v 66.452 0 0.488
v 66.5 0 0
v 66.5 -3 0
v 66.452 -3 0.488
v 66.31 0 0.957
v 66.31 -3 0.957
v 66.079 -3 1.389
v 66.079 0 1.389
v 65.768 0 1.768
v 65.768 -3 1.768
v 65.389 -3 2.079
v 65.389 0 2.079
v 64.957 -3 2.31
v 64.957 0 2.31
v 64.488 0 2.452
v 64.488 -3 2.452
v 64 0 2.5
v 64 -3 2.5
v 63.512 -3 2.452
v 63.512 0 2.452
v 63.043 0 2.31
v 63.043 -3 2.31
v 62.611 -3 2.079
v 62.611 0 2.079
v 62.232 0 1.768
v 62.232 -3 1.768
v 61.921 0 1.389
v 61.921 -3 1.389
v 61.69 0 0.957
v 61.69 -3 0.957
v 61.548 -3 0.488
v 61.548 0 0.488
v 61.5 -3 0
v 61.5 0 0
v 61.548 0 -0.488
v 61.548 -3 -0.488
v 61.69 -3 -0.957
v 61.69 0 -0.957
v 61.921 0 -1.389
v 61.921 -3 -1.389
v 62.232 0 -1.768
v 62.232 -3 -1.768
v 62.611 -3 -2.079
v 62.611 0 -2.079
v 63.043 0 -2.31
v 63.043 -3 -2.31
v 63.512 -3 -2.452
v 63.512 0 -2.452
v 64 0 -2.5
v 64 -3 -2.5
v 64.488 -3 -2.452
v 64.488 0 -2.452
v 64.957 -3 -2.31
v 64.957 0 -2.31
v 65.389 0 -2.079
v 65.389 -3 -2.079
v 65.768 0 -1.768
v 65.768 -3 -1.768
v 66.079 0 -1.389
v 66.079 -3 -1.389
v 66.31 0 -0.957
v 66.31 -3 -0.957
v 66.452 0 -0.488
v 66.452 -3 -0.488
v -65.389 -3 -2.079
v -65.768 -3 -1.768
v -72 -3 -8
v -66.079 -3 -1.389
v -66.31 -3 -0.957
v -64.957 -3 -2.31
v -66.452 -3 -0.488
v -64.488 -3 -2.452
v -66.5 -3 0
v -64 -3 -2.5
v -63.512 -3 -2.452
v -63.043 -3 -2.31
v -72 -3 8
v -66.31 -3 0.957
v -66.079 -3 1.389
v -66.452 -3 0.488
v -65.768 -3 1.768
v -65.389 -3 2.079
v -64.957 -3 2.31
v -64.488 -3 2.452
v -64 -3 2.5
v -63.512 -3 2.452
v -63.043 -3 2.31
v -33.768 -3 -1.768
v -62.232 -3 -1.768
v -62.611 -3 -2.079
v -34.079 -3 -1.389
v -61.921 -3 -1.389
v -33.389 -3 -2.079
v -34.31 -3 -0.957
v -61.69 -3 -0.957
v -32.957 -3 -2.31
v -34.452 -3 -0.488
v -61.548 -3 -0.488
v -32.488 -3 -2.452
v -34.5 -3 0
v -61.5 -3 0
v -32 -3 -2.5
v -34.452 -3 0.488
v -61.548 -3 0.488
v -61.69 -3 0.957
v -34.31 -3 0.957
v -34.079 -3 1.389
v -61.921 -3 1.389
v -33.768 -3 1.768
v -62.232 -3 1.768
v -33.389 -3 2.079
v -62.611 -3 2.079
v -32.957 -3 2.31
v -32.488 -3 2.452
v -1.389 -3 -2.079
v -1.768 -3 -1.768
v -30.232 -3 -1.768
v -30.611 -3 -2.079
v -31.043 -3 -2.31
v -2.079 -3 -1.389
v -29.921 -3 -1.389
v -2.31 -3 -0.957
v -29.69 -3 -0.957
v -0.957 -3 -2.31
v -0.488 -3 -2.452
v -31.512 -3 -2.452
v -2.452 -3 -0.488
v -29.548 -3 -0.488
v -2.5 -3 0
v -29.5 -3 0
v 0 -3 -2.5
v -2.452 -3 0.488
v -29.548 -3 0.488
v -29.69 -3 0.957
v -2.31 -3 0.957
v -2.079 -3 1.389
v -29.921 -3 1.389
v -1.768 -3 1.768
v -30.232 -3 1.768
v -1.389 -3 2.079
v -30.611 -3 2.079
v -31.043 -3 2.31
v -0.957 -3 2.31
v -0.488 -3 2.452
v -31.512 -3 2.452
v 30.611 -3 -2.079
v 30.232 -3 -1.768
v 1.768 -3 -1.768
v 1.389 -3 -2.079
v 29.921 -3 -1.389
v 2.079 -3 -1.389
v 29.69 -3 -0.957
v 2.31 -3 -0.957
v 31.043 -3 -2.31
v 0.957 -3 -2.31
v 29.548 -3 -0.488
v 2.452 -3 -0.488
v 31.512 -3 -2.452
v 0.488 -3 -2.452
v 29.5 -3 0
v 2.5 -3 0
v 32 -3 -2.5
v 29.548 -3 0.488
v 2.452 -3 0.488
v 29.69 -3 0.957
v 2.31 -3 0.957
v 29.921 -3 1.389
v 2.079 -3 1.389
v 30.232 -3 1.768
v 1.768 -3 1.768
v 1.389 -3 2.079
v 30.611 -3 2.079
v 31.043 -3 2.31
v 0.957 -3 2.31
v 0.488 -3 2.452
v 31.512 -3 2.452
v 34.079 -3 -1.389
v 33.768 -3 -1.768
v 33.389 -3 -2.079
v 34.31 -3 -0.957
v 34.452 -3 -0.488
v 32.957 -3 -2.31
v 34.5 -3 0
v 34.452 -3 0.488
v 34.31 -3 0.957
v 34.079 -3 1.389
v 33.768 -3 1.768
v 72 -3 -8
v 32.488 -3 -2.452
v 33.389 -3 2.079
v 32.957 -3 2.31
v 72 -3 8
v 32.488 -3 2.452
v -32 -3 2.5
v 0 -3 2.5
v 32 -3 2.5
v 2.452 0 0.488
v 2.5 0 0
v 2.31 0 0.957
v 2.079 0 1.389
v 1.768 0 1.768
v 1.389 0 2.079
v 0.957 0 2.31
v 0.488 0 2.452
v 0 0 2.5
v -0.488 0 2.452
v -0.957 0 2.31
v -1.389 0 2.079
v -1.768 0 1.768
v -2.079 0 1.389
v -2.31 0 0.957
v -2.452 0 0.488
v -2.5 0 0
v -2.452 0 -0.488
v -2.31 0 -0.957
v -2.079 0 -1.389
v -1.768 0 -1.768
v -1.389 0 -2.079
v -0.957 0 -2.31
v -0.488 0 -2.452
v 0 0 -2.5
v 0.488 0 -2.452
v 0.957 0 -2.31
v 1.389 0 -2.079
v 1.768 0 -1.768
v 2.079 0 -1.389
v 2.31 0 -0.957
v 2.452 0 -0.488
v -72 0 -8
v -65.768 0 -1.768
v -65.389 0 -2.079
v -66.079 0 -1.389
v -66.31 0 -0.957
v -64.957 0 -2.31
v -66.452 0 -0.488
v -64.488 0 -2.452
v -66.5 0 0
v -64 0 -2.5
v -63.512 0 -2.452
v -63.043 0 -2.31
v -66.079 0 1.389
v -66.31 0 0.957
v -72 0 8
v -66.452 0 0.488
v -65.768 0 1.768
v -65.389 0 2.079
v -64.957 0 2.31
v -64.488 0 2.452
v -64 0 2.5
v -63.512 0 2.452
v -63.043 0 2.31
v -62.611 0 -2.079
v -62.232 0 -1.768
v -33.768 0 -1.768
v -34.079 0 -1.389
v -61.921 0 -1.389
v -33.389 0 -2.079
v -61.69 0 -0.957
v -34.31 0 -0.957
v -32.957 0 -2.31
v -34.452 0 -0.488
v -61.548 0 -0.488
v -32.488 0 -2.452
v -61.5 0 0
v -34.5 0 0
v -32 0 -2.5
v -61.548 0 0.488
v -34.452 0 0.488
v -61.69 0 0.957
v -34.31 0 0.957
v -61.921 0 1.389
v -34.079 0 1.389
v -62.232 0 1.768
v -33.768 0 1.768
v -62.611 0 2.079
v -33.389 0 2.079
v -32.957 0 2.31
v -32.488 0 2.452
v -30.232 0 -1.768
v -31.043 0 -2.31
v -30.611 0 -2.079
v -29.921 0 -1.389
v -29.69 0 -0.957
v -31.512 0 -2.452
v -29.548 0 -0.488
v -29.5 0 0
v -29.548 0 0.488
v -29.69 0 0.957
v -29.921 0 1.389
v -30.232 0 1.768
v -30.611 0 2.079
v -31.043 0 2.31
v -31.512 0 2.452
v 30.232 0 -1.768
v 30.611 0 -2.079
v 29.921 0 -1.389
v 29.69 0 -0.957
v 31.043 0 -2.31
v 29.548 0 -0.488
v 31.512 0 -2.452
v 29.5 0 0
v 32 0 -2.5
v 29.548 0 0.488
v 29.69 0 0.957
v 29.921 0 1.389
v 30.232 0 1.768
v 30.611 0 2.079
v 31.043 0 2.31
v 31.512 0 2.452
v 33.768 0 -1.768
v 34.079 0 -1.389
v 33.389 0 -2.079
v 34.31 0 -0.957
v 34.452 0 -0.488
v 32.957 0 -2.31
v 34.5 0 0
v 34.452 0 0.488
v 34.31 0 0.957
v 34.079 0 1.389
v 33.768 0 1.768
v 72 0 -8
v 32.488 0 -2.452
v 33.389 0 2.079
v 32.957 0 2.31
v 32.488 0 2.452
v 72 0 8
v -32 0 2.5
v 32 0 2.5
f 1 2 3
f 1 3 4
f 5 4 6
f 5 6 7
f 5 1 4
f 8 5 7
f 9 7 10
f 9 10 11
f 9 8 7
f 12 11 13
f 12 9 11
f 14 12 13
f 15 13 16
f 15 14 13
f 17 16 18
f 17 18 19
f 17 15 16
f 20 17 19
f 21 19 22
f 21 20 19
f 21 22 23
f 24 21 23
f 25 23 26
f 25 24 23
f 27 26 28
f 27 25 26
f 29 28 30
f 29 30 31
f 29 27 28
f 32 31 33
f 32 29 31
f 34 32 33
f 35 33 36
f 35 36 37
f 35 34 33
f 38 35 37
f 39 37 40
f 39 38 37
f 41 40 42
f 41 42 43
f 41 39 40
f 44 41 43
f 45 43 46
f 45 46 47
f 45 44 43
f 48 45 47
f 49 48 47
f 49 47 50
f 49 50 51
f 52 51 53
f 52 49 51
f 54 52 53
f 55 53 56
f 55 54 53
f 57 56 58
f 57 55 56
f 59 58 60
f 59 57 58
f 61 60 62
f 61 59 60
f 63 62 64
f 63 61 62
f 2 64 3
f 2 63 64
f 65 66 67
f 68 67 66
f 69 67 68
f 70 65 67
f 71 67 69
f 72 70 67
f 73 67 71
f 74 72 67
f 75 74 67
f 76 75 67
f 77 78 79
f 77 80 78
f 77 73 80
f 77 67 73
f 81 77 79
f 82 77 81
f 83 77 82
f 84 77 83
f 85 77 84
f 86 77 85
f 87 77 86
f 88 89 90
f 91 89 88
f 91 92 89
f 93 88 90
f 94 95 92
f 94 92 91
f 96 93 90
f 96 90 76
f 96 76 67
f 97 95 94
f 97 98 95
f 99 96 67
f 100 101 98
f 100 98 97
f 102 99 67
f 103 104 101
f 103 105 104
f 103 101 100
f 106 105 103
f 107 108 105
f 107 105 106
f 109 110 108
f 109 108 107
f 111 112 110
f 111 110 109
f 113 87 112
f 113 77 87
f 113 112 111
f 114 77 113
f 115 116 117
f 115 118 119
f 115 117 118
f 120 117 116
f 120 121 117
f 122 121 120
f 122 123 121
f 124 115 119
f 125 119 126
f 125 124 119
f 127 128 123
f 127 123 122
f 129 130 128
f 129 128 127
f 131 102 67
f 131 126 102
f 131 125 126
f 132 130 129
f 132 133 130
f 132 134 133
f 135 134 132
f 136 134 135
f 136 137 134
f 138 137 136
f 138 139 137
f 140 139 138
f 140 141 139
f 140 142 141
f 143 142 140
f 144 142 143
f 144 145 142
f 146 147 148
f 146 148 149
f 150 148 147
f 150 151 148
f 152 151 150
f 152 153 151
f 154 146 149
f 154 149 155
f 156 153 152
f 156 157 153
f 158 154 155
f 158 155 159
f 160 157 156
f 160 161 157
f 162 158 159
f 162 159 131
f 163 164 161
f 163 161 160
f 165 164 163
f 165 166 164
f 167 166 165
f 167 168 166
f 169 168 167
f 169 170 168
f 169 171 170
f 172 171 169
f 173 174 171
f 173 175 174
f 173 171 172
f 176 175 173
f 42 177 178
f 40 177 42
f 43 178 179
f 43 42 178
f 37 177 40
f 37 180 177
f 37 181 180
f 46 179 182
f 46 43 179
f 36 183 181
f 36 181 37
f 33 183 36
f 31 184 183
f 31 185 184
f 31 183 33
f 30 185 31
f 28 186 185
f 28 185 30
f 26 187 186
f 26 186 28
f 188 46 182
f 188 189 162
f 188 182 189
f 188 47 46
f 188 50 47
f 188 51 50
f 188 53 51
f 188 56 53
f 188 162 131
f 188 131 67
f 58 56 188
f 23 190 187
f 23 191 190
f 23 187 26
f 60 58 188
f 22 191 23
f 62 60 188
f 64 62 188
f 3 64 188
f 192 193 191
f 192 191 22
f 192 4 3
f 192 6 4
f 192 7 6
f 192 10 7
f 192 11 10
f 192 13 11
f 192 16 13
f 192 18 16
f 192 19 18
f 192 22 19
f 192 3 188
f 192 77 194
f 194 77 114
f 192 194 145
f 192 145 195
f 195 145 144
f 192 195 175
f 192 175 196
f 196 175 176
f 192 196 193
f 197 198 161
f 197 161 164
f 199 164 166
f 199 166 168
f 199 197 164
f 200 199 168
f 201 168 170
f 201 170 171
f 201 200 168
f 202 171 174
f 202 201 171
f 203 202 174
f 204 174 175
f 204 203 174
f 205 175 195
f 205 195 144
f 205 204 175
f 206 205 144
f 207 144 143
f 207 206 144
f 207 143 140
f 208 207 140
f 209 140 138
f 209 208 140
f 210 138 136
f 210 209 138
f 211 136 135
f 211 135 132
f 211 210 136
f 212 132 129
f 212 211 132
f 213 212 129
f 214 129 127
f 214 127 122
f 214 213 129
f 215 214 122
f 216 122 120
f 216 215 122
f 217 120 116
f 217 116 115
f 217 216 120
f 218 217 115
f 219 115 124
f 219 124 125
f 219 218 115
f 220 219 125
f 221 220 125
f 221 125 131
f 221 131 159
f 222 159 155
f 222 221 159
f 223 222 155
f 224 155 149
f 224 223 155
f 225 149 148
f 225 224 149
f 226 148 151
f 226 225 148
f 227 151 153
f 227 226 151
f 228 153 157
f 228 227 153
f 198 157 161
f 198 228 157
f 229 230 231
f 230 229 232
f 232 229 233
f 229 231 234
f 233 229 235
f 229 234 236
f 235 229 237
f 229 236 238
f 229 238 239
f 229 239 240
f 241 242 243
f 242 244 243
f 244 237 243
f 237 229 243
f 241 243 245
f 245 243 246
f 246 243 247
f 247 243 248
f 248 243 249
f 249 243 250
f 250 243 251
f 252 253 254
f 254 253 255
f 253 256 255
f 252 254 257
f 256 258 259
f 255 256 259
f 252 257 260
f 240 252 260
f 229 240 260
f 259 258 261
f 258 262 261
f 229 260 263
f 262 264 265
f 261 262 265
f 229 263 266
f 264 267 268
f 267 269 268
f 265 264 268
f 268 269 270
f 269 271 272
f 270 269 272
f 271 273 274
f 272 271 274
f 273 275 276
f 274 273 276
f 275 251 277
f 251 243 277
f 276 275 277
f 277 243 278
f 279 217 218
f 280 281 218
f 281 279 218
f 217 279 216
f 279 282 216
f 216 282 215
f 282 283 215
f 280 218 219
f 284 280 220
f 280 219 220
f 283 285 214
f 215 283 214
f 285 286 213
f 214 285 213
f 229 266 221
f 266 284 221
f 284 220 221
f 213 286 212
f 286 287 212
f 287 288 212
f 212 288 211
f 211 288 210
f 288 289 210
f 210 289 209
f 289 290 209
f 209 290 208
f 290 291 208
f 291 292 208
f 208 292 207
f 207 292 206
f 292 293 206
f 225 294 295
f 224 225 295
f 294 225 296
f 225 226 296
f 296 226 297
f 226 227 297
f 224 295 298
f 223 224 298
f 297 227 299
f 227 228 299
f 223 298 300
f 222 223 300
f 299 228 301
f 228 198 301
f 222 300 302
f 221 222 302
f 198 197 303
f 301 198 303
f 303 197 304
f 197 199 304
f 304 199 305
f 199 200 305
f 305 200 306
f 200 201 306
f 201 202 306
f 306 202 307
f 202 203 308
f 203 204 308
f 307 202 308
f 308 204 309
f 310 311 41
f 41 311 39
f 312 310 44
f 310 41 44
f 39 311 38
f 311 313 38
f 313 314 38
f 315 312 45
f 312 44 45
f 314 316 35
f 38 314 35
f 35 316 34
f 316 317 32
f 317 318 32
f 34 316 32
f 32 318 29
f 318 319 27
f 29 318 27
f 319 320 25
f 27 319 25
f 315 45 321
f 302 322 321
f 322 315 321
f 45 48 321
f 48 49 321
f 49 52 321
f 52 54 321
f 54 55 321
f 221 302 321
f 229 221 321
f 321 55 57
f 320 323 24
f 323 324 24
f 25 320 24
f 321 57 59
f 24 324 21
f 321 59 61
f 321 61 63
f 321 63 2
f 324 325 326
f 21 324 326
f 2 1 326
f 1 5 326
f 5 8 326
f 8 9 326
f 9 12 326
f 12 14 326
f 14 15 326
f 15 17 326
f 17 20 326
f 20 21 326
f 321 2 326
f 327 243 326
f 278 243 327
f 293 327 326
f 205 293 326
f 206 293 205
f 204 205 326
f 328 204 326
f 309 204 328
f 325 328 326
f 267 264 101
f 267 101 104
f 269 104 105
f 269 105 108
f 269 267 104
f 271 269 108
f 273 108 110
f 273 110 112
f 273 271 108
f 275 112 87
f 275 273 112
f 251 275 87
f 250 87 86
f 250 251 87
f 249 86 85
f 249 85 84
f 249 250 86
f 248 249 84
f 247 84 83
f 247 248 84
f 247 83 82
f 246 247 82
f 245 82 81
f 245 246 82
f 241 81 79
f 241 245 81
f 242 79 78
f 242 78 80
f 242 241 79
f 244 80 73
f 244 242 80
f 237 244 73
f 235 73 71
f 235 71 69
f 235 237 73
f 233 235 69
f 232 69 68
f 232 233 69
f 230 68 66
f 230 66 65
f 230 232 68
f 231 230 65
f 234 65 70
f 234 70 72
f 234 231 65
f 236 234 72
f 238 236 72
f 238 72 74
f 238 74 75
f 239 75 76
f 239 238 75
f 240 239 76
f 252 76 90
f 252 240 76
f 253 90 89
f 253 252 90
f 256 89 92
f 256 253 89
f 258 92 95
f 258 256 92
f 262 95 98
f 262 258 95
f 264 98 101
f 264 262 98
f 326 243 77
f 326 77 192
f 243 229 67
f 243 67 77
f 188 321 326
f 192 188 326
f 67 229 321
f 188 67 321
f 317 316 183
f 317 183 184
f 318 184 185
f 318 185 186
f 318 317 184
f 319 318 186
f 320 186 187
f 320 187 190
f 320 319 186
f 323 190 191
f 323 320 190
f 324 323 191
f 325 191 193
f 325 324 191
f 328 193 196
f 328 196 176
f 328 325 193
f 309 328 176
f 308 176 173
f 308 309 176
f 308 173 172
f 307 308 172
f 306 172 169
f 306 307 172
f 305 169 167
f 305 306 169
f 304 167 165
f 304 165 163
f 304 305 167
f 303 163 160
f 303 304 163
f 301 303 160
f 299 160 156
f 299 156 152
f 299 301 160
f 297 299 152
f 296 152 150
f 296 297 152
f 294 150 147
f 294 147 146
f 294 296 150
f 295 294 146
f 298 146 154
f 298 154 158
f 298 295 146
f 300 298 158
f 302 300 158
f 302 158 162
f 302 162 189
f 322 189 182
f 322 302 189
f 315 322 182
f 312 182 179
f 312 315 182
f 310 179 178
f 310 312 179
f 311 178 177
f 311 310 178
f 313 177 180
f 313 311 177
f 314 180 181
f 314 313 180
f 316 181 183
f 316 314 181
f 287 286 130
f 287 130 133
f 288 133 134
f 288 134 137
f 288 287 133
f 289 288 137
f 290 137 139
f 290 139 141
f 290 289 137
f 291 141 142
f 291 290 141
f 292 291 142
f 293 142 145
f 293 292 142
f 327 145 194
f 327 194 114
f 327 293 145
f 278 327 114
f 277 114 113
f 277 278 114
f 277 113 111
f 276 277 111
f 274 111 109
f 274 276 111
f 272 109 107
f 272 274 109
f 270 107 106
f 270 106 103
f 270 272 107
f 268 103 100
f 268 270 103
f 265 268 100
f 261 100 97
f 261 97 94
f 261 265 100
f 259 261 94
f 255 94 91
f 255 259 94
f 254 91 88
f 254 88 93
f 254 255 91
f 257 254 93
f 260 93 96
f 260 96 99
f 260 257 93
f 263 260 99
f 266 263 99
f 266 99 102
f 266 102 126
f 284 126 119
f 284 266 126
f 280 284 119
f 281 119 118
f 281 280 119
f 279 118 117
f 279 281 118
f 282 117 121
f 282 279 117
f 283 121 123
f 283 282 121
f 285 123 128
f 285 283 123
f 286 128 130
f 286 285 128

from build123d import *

# Parameters (mm, degrees)
F0_W     = 144
F0_H     = 16
F0_R     = 2.5
F1_DEPTH = 3


with BuildPart() as f1:
    # F0 (on Front) → F1 (new body)
    with BuildSketch(Plane.XZ):
        Rectangle(F0_W, F0_H)
        with Locations((-64, 0)):
            Circle(F0_R, mode=Mode.SUBTRACT)
        with Locations((-32, 0)):
            Circle(F0_R, mode=Mode.SUBTRACT)
        Circle(F0_R, mode=Mode.SUBTRACT)
        with Locations((32, 0)):
            Circle(F0_R, mode=Mode.SUBTRACT)
        with Locations((64, 0)):
            Circle(F0_R, mode=Mode.SUBTRACT)
    extrude(amount=F1_DEPTH)


solid = f1.part
